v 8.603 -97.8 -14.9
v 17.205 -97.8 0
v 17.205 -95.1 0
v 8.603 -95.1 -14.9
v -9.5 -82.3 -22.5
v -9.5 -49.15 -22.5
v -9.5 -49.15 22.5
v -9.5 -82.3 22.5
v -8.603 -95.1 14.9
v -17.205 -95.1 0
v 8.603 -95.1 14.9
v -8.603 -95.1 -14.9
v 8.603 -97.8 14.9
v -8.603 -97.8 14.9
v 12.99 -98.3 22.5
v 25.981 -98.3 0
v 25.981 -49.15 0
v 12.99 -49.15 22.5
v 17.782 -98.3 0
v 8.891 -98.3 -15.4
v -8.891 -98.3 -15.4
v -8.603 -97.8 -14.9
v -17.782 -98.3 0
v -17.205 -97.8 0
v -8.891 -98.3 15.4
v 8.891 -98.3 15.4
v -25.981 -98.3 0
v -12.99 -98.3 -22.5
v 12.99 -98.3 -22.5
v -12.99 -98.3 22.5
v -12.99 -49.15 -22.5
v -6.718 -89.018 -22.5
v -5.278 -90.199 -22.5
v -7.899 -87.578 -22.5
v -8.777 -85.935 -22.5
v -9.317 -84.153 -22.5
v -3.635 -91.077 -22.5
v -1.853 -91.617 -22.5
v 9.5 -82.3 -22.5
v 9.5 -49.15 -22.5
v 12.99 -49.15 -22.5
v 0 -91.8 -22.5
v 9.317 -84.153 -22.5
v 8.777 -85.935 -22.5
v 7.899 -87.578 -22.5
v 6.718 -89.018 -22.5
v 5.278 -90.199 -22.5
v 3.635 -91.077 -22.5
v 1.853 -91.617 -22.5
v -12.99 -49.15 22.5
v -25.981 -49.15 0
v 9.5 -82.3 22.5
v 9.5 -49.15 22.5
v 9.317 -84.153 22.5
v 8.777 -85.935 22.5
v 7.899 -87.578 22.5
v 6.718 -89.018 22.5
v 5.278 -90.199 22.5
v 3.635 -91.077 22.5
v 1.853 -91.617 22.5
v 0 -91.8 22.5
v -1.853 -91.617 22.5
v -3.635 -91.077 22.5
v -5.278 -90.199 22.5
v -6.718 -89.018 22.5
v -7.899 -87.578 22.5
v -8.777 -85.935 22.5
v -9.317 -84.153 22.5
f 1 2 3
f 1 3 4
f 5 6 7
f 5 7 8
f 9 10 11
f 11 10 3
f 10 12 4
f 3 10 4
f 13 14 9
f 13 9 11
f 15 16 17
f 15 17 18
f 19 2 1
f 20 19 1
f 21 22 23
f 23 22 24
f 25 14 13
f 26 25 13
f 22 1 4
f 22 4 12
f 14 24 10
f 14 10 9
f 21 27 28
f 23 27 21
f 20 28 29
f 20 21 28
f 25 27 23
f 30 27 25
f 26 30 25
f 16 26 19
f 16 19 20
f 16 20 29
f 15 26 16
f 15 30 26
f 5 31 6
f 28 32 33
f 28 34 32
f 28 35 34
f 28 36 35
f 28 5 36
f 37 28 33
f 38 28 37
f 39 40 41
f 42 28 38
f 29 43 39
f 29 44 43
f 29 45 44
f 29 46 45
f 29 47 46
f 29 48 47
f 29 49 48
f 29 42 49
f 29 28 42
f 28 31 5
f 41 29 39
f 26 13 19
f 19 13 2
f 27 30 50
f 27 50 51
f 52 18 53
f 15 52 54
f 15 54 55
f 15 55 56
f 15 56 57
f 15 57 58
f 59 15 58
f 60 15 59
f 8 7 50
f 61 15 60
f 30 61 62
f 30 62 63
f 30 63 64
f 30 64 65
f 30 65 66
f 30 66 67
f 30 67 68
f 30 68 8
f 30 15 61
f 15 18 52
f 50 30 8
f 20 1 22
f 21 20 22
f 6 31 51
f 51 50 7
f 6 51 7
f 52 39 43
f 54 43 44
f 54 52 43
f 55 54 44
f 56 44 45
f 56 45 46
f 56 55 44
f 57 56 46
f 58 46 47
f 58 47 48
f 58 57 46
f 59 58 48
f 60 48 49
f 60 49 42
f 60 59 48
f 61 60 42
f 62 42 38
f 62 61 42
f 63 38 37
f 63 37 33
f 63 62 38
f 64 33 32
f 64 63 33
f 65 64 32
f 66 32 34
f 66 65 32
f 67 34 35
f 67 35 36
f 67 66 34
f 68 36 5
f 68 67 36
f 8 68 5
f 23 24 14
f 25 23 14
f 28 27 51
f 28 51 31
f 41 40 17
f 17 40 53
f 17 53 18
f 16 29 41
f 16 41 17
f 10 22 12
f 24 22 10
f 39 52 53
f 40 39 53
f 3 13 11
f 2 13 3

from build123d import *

# Parameters (mm, degrees)
PAD_DEPTH       = 49.15
POCKET_DEPTH    = 3.2
CHAMFER_SIZE    = 0.5
POCKET001_DEPTH = 45.001


with BuildPart() as body:
    # Sketch → Pad (new body)
    with BuildSketch(Plane.XZ):
        Polygon((25.980762, 0), (12.990381, 22.5), (-12.990381, 22.5), (-25.980762, 0), (-12.990381, -22.5), (12.990381, -22.5), align=None)
    extrude(amount=PAD_DEPTH)

    # Sketch017 → Pocket (cut)
    with BuildSketch(Plane(origin=(0, 0, 0), x_dir=(1, 0, 0), z_dir=(0, 1, 0))):
        Polygon((17.205038, 0), (8.602519, 14.9), (-8.602519, 14.9), (-17.205038, 0), (-8.602519, -14.9), (8.602519, -14.9), align=None)
    extrude(amount=-POCKET_DEPTH, mode=Mode.SUBTRACT)

    # Chamfer
    chamfer_edges = [body.edges().sort_by_distance(p)[0] for p in [
        (12.903779, 0, 7.45),
        (12.903779, 0, -7.45),
        (0, 0, -14.9),
        (-12.903779, 0, -7.45),
        (-12.903779, 0, 7.45),
        (0, 0, 14.9),
    ]]
    chamfer(chamfer_edges, length=CHAMFER_SIZE)

    # Sketch018 (on Face10 of Chamfer) → Pocket001 (cut, through all)
    with BuildSketch(Plane(origin=(0, 0, 22.5), x_dir=(-1, 0, 0), z_dir=(0, 0, 1))):
        with BuildLine():
            ThreePointArc((-9.5, 16), (0, 6.5), (9.5, 16))
            Line((9.5, 49.15), (9.5, 16))
            Line((-9.5, 49.15), (9.5, 49.15))
            Line((-9.5, 16), (-9.5, 49.15))
        make_face()
    extrude(amount=-POCKET001_DEPTH, mode=Mode.SUBTRACT)


with BuildPart() as part_mirroring:
    # Part__Mirroring: instance of Body
    add(body.part.mirror(Plane(origin=(0, 0, 0), x_dir=(1, 0, 0), z_dir=(0, 1, 0))))


with BuildPart() as part_mirroring_1:
    # Part__Mirroring placement: moved
    add(part_mirroring.part.moved(Location((0, -98.3, 0))))


solid = part_mirroring_1.part
